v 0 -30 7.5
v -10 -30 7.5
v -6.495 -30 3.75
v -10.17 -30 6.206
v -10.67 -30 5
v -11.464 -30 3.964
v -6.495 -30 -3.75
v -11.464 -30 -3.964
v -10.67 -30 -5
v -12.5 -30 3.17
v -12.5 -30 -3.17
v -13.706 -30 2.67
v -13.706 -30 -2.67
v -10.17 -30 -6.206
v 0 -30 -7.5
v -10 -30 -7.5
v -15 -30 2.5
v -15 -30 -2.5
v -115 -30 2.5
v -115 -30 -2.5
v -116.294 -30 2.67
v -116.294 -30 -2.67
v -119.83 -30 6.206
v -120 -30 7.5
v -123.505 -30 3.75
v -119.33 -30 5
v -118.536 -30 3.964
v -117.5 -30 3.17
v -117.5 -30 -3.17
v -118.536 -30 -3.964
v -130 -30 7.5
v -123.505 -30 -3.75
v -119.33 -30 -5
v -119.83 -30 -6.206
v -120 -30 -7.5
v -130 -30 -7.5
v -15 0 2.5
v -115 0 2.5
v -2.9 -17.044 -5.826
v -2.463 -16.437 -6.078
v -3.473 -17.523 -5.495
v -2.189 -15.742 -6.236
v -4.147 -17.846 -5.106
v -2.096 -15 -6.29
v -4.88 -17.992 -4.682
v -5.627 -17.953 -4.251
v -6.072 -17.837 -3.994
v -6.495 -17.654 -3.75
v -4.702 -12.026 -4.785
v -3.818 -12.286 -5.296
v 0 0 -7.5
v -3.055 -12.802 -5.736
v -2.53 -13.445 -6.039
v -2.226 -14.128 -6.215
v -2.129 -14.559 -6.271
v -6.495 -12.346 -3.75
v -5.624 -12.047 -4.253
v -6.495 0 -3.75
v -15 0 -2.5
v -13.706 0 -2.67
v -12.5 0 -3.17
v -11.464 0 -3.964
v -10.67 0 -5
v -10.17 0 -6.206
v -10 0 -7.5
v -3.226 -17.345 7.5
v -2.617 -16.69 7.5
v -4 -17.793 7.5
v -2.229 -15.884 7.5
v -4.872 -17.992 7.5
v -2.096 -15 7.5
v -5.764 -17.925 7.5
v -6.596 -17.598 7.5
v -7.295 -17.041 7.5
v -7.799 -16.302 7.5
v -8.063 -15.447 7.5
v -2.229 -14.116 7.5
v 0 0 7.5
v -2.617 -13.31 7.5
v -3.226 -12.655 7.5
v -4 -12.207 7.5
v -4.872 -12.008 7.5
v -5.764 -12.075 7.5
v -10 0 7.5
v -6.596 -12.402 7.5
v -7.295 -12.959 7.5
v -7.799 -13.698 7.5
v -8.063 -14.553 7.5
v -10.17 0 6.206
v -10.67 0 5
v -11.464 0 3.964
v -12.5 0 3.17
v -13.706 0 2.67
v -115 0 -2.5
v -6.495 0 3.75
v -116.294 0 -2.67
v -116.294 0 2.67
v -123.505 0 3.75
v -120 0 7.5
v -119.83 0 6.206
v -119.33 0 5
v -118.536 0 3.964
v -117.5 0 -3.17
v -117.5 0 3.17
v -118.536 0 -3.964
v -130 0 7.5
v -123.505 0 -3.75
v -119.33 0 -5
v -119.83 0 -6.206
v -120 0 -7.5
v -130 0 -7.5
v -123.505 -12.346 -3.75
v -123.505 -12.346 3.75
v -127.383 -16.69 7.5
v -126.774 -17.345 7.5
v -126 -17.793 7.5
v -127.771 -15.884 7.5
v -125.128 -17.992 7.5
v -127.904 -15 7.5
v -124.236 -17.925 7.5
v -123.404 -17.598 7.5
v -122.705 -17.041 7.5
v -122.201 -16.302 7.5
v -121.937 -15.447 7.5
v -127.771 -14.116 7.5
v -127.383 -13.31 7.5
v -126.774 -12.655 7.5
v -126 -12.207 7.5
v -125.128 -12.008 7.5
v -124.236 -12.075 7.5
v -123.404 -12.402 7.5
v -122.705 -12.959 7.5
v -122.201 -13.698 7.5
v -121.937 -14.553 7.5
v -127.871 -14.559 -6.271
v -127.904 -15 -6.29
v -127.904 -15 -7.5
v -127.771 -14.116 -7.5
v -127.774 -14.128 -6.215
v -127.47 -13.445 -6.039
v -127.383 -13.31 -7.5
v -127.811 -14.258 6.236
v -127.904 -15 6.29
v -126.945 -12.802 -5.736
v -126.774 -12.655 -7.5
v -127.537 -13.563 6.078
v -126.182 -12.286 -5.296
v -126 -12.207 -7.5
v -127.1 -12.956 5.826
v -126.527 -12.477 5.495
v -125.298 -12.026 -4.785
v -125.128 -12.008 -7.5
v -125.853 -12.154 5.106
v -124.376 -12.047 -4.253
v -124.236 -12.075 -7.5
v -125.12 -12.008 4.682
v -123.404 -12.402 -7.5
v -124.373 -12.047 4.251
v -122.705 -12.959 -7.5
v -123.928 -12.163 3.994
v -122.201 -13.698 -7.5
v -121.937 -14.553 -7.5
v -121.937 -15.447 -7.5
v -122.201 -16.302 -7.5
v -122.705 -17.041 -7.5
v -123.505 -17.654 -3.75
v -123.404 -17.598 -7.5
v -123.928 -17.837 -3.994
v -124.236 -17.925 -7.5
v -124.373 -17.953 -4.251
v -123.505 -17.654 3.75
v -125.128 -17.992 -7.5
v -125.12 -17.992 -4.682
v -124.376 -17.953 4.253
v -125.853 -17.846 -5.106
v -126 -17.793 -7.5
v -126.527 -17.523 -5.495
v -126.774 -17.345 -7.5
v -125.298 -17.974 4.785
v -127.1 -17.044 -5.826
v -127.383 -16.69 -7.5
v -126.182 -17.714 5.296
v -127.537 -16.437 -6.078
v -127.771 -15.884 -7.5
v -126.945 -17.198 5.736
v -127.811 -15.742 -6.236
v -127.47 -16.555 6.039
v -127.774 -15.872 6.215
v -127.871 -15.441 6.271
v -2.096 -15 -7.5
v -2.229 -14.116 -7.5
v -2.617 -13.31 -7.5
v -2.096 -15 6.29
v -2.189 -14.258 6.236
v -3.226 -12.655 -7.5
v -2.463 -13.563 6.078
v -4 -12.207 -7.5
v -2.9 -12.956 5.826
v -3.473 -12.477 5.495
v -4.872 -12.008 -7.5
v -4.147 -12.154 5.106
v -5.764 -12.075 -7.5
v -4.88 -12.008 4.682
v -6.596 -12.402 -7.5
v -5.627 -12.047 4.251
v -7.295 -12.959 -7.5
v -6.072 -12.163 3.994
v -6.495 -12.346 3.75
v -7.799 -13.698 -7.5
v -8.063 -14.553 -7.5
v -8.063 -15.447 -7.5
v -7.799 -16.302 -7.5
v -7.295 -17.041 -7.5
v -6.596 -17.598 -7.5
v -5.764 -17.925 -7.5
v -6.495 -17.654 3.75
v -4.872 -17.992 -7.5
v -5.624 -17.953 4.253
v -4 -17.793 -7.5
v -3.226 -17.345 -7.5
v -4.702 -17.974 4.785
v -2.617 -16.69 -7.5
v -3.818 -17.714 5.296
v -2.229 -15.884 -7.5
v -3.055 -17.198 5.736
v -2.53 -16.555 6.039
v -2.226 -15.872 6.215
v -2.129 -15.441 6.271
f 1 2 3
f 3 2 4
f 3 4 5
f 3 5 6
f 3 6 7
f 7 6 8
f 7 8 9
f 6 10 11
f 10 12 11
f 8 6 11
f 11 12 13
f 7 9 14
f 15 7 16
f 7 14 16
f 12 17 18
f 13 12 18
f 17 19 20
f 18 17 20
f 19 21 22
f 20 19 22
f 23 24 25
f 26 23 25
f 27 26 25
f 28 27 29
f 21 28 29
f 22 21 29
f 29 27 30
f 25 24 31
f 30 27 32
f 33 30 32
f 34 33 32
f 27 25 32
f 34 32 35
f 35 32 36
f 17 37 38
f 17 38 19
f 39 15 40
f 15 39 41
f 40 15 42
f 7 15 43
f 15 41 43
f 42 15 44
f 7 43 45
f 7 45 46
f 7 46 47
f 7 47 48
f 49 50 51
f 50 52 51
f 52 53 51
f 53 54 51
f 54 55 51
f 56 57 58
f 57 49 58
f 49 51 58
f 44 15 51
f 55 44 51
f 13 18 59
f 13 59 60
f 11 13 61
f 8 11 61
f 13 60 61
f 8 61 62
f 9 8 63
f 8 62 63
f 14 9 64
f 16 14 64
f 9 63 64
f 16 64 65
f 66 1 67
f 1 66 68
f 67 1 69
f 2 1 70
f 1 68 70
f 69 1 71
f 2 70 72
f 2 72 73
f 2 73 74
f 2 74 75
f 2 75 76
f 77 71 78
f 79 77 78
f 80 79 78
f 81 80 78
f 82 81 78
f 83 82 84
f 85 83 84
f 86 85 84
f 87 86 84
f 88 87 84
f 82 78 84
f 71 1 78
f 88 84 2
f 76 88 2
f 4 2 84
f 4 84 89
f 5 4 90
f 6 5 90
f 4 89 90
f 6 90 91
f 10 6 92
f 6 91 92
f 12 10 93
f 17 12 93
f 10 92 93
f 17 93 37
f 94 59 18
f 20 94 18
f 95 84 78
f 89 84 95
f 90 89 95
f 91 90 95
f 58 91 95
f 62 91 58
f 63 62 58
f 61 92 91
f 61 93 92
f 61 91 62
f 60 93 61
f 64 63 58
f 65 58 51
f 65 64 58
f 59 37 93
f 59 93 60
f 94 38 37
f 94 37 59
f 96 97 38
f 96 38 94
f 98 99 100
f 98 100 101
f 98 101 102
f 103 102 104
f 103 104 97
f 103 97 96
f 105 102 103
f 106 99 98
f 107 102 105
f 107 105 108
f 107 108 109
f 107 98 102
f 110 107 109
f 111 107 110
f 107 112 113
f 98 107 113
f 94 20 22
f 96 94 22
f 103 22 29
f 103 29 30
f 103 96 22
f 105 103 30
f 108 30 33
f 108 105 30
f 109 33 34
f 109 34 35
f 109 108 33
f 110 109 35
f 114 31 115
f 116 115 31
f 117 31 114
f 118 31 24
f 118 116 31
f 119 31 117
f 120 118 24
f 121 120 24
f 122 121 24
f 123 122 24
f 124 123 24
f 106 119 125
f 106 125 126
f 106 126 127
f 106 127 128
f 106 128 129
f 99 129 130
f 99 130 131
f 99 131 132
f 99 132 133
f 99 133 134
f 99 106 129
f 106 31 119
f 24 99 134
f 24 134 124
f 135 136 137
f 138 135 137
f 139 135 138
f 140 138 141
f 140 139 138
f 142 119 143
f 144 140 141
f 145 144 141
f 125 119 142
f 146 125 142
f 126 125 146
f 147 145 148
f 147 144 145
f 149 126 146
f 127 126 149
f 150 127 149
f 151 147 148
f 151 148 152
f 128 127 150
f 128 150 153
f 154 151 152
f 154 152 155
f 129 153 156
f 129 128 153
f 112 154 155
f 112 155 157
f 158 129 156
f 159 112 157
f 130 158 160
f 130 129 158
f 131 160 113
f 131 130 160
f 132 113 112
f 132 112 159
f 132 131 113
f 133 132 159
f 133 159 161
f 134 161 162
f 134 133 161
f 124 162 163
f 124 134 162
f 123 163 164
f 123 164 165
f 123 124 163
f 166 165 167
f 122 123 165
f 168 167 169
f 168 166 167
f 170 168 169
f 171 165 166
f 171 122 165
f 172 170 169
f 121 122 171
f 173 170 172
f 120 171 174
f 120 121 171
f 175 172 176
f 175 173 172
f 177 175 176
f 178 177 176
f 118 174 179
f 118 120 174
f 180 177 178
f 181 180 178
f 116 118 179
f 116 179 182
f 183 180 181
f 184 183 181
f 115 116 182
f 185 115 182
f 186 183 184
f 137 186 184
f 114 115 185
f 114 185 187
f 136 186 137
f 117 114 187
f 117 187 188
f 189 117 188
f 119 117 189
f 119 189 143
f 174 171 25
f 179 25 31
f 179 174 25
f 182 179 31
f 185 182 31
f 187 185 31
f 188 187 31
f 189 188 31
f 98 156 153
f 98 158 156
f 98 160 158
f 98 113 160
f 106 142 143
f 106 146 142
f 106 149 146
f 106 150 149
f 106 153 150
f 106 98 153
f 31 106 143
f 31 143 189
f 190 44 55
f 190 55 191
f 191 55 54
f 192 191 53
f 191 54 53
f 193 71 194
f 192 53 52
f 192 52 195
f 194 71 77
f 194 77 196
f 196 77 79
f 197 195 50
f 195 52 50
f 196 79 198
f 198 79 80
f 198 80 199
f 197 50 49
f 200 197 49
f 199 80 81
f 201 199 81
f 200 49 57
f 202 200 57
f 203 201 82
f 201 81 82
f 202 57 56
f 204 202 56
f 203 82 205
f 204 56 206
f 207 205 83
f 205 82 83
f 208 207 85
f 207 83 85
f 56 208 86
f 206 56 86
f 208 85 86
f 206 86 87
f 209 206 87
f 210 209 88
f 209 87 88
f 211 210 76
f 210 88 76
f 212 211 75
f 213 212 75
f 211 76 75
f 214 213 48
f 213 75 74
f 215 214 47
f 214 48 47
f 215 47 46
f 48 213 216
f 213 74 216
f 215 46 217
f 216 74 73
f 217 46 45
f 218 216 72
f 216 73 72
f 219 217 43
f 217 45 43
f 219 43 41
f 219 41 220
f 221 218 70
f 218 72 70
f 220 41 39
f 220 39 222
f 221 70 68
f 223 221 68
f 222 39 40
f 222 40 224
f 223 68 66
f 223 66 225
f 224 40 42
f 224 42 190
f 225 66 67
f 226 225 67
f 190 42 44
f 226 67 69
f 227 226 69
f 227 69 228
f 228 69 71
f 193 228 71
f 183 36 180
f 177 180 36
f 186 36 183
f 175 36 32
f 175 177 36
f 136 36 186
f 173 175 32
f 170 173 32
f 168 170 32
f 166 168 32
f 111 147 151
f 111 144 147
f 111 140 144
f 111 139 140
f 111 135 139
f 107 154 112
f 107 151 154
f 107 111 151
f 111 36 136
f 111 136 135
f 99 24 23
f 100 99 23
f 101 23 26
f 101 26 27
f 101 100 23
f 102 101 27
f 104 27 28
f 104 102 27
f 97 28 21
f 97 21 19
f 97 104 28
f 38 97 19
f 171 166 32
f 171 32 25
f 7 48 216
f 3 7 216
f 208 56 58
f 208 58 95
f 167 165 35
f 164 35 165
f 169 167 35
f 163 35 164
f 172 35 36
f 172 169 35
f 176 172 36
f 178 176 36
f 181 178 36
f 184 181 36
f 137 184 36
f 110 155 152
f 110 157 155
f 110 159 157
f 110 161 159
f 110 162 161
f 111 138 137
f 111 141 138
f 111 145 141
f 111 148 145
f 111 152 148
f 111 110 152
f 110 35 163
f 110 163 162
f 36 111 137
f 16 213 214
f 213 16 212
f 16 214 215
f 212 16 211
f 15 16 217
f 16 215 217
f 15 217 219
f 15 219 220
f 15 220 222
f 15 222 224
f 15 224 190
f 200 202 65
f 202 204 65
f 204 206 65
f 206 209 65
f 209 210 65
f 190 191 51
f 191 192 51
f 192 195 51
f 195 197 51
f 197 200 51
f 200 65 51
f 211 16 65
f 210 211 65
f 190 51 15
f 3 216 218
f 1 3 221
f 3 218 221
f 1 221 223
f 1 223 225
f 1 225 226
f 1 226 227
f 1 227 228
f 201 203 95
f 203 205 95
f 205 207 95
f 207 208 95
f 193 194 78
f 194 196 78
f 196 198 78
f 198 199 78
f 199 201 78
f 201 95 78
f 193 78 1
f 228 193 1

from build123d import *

# Parameters (mm, degrees)
F1_DEPTH = 30
F2_R     = 3
F3_DEPTH = 15
F4_DEPTH = 50


with BuildPart() as f1:
    # F0 (on Front) → F1 (new body)
    with BuildSketch(Plane.XZ):
        with BuildLine():
            ThreePointArc((-15, -2.5), (-11.4644660941, -3.9644660941), (-10, -7.5))
            Line((-10, -7.5), (0, -7.5))
            Line((0, -7.5), (-6.4951905284, -3.75))
            Line((-6.4951905284, -3.75), (-6.4951905284, 3.75))
            Line((-6.4951905284, 3.75), (0, 7.5))
            Line((0, 7.5), (-10, 7.5))
            ThreePointArc((-10, 7.5), (-11.4644660941, 3.9644660941), (-15, 2.5))
            Line((-15, 2.5), (-15, -2.5))
        make_face()
    extrude(amount=F1_DEPTH)

    # F2 (on face) → F3 (cut, through all)
    with BuildSketch(Plane.XY.offset(7.5)):
        with Locations((-5.096135661, -15)):
            Circle(F2_R)
    extrude(amount=-F3_DEPTH, mode=Mode.SUBTRACT)

    # F4 (add): a face of the model
    f4_faces = [f1.faces().sort_by_distance(p)[0] for p in [
        (-15, -15, 0),
    ]]
    extrude(f4_faces, amount=F4_DEPTH)

    # F5: F1 across face


with BuildPart() as f1_1:
    add(f1.part)
    add(f1.part.mirror(Plane(origin=(-65, -15, 0), x_dir=(0, -1, 0), z_dir=(-1, 0, 0))))


solid = f1_1.part
